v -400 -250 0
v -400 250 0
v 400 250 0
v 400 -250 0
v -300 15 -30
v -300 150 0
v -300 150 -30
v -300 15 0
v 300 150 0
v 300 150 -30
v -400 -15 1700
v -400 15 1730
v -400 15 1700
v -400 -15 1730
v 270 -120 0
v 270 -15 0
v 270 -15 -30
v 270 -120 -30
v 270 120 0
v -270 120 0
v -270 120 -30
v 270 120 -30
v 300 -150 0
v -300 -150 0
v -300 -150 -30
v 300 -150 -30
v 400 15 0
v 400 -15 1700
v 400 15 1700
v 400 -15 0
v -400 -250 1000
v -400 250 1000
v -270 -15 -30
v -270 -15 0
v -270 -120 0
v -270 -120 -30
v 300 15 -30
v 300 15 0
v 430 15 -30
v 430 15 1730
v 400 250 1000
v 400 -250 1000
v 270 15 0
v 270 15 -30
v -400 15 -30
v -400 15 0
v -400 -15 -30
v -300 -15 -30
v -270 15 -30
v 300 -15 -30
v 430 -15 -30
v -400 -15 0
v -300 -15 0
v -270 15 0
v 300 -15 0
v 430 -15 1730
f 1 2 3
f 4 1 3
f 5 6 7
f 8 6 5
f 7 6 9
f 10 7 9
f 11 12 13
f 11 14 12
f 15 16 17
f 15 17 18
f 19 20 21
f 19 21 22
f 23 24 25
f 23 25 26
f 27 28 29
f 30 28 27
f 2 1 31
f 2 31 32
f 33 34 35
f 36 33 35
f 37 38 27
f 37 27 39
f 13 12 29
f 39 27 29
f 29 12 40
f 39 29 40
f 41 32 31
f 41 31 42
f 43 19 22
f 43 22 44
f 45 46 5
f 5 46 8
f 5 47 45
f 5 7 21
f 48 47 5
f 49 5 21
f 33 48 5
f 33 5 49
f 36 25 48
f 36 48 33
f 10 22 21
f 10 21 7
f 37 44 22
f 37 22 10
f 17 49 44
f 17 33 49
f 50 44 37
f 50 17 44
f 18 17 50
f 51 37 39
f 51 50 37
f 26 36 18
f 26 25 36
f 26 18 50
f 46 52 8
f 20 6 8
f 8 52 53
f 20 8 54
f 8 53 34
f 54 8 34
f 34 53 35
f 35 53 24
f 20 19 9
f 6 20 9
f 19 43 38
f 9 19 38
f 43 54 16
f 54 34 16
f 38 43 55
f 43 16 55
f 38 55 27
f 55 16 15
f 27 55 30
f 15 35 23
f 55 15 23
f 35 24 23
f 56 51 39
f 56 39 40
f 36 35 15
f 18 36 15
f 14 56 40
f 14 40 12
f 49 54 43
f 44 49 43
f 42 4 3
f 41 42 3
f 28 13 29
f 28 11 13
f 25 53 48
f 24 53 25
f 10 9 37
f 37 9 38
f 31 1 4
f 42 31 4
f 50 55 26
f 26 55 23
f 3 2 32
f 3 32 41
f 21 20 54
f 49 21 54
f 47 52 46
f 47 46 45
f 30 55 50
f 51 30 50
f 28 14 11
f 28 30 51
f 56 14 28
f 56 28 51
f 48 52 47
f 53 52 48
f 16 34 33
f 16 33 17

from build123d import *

# Parameters (mm, degrees)
F0_W     = 800
F0_H     = 500
F1_DEPTH = 1000
F3_DEPTH = 15
F4_W     = 600
F4_H     = 300
F4_W_2   = 540
F4_H_2   = 240
F5_DEPTH = 30


with BuildPart() as f1:
    # F0 (on Top) → F1 (new body)
    with BuildSketch(Plane.XY):
        Rectangle(F0_W, F0_H)
    extrude(amount=F1_DEPTH)


with BuildPart() as f3:
    # F2 (on Front) → F3 (new body, symmetric)
    with BuildSketch(Plane.XZ):
        Polygon((400, 1700), (400, 0), (-400, 0), (-400, -30), (430, -30), (430, 1730), (-400, 1730), (-400, 1700), align=None)
    extrude(amount=F3_DEPTH, both=True)

    # F4 (on face) → F5 (join)
    with BuildSketch(Plane(origin=(0, 0, 0), x_dir=(1, 0, 0), z_dir=(0, 0, -1))):
        Rectangle(F4_W, F4_H)
        Rectangle(F4_W_2, F4_H_2, mode=Mode.SUBTRACT)
    extrude(amount=F5_DEPTH)


solid = Compound([f1.part, f3.part])
